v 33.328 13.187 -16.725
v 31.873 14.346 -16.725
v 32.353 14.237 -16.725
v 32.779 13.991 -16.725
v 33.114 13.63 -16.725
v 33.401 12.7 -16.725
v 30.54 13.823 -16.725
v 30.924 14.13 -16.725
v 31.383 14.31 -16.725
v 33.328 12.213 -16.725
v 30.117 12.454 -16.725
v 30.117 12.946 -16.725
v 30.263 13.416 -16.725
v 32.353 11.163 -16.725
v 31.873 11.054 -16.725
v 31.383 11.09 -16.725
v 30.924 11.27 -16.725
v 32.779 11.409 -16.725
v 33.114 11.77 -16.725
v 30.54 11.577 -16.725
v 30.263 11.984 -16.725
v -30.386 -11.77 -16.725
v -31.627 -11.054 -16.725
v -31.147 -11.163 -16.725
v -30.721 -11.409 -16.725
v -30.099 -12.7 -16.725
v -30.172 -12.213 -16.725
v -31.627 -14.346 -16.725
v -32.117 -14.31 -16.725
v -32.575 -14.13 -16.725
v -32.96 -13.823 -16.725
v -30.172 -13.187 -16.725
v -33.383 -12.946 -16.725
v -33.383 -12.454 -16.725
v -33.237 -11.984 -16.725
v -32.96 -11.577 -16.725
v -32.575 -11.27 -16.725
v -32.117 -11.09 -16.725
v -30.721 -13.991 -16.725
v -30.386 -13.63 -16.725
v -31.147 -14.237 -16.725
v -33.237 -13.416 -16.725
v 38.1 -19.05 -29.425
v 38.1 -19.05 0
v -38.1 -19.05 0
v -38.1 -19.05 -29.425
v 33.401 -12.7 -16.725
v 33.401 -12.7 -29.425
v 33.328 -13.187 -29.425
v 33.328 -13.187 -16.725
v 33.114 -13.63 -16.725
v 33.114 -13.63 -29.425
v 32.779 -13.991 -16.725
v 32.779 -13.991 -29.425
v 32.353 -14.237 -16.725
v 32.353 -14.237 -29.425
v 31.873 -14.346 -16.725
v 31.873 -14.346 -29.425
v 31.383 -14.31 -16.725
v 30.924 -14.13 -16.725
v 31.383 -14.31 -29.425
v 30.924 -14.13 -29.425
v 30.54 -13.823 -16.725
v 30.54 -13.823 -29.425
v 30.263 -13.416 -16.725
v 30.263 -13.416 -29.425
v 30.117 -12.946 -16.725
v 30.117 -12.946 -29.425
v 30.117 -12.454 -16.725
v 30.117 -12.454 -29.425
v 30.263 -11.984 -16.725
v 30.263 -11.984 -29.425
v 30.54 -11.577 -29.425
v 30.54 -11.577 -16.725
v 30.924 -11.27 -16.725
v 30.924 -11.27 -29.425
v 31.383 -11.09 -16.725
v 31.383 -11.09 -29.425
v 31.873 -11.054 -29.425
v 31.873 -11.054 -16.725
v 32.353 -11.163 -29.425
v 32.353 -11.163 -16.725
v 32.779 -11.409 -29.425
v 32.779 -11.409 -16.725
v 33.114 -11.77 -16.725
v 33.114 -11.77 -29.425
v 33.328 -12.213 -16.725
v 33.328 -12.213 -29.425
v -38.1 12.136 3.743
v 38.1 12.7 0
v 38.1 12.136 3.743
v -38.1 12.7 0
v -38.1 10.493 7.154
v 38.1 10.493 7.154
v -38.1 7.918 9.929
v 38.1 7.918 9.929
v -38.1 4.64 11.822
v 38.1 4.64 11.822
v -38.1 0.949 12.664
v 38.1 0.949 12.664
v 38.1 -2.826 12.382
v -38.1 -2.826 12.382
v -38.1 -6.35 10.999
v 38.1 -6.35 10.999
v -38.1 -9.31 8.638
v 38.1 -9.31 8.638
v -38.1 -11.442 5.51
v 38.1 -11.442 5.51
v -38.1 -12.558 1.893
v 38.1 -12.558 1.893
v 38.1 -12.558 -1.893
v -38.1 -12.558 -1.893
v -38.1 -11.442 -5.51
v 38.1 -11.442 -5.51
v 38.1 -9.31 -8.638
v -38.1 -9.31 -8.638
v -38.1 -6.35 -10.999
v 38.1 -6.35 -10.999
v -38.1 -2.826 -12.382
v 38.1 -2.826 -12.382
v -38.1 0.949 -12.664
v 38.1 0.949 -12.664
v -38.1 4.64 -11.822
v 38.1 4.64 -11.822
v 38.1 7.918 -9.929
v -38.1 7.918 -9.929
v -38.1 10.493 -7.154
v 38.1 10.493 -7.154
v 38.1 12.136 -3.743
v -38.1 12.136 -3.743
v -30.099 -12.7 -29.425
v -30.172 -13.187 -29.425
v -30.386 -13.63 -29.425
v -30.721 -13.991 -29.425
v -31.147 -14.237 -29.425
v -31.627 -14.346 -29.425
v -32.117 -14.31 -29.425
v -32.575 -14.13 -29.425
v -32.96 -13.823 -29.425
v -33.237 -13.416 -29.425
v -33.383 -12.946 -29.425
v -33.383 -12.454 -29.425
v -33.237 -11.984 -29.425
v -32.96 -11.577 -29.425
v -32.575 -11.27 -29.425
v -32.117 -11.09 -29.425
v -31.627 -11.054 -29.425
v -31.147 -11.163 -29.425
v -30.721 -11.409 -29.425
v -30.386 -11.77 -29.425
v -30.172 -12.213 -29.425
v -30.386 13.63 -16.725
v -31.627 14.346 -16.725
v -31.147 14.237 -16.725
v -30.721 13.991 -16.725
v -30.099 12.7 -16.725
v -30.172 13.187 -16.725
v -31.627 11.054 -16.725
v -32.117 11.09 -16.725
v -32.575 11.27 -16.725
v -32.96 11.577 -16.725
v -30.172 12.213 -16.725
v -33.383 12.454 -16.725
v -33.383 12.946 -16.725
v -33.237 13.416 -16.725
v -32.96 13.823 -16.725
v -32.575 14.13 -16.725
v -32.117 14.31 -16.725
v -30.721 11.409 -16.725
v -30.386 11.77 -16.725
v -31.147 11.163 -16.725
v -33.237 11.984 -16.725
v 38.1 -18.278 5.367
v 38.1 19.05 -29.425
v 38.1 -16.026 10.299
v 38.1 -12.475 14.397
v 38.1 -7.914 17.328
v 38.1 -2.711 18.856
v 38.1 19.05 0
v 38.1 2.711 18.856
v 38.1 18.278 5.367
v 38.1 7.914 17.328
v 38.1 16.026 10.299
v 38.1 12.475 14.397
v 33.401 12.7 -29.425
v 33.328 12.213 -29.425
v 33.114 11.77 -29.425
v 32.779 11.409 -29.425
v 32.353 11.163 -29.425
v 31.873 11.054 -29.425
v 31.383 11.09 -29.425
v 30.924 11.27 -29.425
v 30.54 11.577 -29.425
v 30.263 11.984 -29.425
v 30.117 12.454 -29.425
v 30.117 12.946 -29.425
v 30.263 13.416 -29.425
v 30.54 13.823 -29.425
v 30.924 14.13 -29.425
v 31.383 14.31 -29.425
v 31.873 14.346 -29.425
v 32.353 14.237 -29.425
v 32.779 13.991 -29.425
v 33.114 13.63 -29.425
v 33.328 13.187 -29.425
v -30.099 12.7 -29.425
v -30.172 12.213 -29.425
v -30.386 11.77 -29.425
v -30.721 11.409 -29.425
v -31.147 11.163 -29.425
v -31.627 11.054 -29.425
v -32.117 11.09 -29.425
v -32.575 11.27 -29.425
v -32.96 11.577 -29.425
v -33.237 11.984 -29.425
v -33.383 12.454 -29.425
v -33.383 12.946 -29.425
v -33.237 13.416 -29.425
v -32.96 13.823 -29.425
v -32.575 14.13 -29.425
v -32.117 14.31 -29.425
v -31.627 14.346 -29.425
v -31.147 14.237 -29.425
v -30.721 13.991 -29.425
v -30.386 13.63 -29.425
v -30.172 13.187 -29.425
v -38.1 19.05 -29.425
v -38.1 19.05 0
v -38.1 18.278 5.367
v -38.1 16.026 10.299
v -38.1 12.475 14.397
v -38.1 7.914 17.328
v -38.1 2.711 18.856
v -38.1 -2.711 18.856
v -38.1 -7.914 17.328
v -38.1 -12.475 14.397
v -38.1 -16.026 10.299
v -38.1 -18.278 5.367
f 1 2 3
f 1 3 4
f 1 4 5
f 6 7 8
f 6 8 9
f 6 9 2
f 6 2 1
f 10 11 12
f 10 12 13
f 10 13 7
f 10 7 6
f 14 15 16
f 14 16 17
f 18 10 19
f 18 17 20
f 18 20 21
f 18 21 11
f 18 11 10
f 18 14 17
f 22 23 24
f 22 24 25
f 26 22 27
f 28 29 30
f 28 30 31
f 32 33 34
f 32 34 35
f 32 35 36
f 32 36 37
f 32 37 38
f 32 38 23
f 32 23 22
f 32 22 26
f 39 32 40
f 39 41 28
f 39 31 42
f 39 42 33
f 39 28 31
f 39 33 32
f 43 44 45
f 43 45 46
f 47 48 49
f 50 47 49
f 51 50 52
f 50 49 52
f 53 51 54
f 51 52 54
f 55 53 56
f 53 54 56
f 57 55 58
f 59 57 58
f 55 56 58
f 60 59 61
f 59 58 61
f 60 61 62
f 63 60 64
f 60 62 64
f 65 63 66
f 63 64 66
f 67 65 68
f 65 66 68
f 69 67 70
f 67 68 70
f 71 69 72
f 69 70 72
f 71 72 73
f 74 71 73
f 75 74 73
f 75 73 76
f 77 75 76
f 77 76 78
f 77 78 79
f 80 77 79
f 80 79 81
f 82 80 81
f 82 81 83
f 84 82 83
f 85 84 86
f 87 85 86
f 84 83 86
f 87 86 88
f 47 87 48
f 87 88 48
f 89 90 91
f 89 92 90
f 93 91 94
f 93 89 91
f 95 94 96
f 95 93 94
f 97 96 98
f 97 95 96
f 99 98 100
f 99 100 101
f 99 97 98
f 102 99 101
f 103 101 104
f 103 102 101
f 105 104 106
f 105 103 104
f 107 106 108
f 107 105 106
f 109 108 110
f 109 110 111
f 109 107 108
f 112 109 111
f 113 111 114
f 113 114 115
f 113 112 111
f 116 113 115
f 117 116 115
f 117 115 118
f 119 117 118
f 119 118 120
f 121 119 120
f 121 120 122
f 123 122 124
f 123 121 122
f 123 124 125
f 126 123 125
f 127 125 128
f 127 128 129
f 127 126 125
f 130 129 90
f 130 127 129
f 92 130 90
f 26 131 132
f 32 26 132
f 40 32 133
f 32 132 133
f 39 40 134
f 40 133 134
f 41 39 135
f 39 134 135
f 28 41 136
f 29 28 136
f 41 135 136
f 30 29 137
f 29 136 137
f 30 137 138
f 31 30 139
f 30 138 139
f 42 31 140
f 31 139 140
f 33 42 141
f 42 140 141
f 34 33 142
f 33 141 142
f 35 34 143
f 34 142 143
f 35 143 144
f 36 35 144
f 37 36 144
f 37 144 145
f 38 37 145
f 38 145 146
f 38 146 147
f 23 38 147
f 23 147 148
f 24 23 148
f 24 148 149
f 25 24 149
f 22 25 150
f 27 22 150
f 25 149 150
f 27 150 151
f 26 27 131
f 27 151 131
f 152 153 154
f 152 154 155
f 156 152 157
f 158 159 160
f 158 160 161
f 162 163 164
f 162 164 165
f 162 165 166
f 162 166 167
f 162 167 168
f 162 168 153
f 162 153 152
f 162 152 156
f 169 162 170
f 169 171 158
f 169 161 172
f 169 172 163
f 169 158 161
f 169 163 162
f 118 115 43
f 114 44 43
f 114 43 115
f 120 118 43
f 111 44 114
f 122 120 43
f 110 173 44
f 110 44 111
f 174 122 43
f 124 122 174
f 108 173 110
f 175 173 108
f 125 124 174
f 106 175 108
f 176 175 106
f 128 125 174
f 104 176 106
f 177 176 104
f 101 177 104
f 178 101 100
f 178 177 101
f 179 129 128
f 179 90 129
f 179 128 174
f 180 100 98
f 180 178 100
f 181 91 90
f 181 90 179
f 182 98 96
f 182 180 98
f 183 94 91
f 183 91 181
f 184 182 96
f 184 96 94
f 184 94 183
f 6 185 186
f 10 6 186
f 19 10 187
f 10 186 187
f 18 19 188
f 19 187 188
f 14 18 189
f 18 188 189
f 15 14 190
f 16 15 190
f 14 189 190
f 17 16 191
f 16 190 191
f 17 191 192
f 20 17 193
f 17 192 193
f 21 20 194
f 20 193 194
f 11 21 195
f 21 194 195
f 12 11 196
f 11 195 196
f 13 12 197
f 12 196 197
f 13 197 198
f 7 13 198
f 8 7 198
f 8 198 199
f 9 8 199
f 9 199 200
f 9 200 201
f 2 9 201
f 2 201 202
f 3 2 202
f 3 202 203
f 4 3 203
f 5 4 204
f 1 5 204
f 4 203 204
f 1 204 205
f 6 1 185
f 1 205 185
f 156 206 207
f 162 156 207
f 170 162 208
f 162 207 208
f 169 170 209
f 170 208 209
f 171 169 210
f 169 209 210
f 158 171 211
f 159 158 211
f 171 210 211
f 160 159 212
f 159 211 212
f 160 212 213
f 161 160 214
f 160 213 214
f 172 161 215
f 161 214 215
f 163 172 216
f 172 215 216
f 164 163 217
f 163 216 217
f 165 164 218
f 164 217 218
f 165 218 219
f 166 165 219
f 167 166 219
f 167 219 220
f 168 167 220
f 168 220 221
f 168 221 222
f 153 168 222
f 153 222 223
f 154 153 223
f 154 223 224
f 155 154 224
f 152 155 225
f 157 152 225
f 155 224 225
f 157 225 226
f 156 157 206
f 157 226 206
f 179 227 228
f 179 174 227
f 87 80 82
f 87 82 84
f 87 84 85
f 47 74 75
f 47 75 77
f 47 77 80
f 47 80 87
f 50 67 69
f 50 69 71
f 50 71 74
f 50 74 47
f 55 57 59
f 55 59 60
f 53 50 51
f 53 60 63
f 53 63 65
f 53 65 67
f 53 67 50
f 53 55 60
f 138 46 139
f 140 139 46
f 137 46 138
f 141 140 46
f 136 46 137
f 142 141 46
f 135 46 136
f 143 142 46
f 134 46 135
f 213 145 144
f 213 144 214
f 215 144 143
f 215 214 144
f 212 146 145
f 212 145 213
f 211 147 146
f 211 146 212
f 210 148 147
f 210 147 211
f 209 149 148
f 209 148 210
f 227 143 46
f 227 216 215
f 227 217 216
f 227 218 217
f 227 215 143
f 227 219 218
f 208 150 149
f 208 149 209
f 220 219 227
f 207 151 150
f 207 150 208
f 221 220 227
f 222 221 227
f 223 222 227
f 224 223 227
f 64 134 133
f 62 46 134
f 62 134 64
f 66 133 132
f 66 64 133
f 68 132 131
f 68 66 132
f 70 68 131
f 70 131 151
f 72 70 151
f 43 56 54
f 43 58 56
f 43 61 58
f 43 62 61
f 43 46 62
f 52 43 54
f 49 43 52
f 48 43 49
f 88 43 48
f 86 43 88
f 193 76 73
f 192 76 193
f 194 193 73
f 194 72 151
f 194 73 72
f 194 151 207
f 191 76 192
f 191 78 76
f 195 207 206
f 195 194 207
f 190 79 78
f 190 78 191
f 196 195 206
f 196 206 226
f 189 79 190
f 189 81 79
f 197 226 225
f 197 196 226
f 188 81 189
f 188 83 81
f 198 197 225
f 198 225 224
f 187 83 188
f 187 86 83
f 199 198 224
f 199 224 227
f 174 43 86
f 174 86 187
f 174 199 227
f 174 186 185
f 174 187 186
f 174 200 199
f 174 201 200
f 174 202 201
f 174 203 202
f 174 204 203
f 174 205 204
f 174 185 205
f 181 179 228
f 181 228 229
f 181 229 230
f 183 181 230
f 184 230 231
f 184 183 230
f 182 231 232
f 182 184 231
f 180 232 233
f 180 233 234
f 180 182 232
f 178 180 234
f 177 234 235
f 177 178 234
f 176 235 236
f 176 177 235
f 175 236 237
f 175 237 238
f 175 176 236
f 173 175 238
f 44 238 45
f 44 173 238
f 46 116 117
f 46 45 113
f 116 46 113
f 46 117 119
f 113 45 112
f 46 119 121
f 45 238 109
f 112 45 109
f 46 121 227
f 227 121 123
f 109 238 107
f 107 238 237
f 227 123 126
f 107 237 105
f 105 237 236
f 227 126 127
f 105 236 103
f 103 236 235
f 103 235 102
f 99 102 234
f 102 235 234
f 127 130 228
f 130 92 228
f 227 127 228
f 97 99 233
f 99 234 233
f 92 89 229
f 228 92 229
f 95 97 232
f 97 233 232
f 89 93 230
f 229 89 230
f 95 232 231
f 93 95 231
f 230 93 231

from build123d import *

# Parameters (mm, degrees)
F0_R     = 12.7
F1_DEPTH = 38.1
F2_R     = 1.651
F3_DEPTH = 12.7


with BuildPart() as f1:
    # F0 (on Right) → F1 (new body, symmetric)
    with BuildSketch(Plane.YZ):
        with BuildLine():
            Line((19.05, -29.424714), (19.05, 0))
            ThreePointArc((19.05, 0), (0, 19.05), (-19.05, 0))
            Line((-19.05, 0), (-19.05, -29.424714))
            Line((-19.05, -29.424714), (19.05, -29.424714))
        make_face()
        Circle(F0_R, mode=Mode.SUBTRACT)
    extrude(amount=F1_DEPTH, both=True)

    # F2 (on face) → F3 (cut)
    with BuildSketch(Plane(origin=(0, 0, -29.424714), x_dir=(1, 0, 0), z_dir=(0, 0, -1))):
        with Locations((31.75, 12.7)):
            Circle(F2_R)
        with Locations((-31.75, 12.7)):
            Circle(F2_R)
        with Locations((-31.75, -12.7)):
            Circle(F2_R)
        with Locations((31.75, -12.7)):
            Circle(F2_R)
    extrude(amount=-F3_DEPTH, mode=Mode.SUBTRACT)


solid = f1.part
